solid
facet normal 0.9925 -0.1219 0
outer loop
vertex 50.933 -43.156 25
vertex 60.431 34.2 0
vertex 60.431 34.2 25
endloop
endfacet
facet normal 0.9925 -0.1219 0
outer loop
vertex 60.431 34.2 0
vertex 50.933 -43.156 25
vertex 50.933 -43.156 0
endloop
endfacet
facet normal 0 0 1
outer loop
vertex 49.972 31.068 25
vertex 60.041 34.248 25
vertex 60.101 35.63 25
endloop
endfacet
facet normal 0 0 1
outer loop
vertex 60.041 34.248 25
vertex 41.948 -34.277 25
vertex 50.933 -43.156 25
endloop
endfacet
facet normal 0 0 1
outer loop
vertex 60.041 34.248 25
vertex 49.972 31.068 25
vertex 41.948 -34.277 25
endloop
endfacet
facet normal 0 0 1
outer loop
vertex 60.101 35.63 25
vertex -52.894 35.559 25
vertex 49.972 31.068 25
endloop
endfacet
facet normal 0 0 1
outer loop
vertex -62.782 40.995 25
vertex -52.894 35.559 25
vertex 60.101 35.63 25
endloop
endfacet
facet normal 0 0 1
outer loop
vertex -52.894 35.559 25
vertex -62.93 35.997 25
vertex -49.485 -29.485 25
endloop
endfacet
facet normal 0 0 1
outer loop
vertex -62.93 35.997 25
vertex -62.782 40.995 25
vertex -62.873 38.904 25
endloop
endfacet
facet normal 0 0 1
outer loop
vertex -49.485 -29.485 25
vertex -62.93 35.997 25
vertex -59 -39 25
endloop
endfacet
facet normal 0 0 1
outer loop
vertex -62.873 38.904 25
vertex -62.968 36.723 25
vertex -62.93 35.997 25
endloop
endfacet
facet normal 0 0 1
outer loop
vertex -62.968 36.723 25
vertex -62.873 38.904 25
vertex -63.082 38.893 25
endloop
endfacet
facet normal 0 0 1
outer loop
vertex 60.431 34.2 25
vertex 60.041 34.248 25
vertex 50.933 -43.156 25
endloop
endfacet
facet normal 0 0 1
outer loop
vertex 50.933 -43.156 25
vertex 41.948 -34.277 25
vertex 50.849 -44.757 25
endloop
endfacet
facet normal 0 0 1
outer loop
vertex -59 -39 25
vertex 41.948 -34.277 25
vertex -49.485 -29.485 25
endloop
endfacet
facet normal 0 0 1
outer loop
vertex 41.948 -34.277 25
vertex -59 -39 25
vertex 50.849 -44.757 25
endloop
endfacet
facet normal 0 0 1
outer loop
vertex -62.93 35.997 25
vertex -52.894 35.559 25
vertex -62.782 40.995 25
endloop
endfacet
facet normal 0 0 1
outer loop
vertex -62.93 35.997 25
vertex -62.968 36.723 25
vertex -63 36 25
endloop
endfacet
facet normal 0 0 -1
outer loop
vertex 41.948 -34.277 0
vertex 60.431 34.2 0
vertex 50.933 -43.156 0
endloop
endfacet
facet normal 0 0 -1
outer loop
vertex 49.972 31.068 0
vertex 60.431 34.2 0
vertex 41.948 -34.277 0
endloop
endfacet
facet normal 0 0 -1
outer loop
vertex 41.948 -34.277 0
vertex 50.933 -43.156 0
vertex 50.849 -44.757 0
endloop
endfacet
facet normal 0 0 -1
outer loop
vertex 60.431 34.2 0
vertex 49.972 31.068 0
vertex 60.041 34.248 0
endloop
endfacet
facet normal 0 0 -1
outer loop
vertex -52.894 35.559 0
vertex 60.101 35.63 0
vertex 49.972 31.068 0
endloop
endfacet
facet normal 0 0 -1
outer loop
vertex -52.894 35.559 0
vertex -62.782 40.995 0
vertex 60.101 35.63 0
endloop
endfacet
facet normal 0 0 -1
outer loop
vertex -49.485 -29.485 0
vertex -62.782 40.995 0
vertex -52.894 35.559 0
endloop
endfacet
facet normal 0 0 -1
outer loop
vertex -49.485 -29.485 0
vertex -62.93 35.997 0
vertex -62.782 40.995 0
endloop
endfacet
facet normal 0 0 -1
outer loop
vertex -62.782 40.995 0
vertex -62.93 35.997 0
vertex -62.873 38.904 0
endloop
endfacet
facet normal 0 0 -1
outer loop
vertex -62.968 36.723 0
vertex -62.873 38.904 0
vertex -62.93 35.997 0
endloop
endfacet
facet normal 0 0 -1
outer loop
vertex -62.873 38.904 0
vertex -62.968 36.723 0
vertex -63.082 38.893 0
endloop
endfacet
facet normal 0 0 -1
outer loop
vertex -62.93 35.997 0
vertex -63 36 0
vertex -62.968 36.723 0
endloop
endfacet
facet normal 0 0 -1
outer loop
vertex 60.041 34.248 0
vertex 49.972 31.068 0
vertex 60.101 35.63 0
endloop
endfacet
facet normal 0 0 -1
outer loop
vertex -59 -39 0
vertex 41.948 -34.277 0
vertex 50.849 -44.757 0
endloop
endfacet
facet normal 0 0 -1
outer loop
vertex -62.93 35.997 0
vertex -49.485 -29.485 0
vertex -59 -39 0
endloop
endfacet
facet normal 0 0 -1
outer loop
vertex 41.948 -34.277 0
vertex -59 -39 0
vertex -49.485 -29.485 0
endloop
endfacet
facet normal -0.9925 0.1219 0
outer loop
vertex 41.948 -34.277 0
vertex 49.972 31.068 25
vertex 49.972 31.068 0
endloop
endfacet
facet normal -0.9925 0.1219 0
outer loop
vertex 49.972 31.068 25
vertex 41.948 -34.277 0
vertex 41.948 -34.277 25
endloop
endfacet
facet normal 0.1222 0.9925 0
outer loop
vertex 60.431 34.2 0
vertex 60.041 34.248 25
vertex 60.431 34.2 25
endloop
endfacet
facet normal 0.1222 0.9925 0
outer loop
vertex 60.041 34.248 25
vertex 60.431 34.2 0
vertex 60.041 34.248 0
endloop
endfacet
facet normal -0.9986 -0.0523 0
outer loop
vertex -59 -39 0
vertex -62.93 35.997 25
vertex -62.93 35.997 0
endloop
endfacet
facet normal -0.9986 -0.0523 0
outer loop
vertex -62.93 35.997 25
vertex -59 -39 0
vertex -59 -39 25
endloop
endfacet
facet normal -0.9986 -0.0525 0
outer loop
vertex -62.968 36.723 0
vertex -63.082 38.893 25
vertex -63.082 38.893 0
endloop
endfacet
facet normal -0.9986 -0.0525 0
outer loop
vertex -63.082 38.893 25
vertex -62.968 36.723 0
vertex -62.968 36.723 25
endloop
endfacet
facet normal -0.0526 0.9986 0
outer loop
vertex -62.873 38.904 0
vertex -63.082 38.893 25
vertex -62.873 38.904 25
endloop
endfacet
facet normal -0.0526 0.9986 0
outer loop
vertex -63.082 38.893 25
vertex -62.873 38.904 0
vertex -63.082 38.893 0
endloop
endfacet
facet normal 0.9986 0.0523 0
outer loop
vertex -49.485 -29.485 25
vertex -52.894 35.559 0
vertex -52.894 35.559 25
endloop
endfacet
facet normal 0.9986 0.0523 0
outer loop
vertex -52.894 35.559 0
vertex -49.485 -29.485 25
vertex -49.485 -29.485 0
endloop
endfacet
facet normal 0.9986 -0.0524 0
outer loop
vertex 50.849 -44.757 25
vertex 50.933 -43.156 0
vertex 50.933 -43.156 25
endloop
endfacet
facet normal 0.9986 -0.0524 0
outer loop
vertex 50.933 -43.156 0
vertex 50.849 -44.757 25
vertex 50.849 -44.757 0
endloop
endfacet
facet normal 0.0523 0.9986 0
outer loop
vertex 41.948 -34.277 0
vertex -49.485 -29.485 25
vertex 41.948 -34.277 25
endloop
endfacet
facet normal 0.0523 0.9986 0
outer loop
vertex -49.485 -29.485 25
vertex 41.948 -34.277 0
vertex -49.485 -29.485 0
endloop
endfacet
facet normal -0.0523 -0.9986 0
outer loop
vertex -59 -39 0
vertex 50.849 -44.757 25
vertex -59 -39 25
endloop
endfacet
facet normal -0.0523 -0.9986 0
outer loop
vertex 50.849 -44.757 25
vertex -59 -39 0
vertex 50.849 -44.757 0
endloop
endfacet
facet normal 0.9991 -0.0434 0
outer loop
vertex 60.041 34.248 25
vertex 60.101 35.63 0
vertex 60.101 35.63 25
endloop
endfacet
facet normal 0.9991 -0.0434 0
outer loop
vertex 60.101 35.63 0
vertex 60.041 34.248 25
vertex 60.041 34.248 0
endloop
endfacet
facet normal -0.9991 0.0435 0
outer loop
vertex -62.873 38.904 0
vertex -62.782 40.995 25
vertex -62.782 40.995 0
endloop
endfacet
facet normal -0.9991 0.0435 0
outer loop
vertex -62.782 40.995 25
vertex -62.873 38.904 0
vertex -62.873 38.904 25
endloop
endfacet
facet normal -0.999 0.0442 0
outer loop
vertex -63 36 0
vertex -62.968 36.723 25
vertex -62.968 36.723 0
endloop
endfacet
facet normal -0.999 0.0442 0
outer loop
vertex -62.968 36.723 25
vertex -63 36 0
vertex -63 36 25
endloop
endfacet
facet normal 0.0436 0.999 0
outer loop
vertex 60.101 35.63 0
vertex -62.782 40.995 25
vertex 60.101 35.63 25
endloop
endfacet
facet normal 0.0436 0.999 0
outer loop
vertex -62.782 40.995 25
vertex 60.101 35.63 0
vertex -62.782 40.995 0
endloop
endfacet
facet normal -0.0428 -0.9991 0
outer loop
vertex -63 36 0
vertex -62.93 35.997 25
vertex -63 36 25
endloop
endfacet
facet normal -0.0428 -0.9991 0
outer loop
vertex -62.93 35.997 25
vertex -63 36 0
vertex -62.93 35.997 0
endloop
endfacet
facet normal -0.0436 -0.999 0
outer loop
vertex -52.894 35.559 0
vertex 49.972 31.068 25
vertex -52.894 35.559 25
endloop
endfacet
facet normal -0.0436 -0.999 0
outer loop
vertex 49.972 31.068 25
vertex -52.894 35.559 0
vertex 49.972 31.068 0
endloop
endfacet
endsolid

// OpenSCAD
*color("blue")
	import("/home/leebc/maker/planet_laser_etch/Earth/gulf_of_mexico.stl", convexity=3);

color("red")
	translate([41,-42,0])
		rotate([0,0,-7])
			cube([10,78,25]);


color("green")
	translate([-59,-39,0])
		rotate([0,0,3])
			cube([10,78,25]);

color("purple")
	translate([-59,-39,0])
		rotate([0,0,-3])
			cube([110,10,25]);

color("yellow")
	translate([-63,36,0])
		rotate([0,0,-2.5])
			cube([123,5,25]);
